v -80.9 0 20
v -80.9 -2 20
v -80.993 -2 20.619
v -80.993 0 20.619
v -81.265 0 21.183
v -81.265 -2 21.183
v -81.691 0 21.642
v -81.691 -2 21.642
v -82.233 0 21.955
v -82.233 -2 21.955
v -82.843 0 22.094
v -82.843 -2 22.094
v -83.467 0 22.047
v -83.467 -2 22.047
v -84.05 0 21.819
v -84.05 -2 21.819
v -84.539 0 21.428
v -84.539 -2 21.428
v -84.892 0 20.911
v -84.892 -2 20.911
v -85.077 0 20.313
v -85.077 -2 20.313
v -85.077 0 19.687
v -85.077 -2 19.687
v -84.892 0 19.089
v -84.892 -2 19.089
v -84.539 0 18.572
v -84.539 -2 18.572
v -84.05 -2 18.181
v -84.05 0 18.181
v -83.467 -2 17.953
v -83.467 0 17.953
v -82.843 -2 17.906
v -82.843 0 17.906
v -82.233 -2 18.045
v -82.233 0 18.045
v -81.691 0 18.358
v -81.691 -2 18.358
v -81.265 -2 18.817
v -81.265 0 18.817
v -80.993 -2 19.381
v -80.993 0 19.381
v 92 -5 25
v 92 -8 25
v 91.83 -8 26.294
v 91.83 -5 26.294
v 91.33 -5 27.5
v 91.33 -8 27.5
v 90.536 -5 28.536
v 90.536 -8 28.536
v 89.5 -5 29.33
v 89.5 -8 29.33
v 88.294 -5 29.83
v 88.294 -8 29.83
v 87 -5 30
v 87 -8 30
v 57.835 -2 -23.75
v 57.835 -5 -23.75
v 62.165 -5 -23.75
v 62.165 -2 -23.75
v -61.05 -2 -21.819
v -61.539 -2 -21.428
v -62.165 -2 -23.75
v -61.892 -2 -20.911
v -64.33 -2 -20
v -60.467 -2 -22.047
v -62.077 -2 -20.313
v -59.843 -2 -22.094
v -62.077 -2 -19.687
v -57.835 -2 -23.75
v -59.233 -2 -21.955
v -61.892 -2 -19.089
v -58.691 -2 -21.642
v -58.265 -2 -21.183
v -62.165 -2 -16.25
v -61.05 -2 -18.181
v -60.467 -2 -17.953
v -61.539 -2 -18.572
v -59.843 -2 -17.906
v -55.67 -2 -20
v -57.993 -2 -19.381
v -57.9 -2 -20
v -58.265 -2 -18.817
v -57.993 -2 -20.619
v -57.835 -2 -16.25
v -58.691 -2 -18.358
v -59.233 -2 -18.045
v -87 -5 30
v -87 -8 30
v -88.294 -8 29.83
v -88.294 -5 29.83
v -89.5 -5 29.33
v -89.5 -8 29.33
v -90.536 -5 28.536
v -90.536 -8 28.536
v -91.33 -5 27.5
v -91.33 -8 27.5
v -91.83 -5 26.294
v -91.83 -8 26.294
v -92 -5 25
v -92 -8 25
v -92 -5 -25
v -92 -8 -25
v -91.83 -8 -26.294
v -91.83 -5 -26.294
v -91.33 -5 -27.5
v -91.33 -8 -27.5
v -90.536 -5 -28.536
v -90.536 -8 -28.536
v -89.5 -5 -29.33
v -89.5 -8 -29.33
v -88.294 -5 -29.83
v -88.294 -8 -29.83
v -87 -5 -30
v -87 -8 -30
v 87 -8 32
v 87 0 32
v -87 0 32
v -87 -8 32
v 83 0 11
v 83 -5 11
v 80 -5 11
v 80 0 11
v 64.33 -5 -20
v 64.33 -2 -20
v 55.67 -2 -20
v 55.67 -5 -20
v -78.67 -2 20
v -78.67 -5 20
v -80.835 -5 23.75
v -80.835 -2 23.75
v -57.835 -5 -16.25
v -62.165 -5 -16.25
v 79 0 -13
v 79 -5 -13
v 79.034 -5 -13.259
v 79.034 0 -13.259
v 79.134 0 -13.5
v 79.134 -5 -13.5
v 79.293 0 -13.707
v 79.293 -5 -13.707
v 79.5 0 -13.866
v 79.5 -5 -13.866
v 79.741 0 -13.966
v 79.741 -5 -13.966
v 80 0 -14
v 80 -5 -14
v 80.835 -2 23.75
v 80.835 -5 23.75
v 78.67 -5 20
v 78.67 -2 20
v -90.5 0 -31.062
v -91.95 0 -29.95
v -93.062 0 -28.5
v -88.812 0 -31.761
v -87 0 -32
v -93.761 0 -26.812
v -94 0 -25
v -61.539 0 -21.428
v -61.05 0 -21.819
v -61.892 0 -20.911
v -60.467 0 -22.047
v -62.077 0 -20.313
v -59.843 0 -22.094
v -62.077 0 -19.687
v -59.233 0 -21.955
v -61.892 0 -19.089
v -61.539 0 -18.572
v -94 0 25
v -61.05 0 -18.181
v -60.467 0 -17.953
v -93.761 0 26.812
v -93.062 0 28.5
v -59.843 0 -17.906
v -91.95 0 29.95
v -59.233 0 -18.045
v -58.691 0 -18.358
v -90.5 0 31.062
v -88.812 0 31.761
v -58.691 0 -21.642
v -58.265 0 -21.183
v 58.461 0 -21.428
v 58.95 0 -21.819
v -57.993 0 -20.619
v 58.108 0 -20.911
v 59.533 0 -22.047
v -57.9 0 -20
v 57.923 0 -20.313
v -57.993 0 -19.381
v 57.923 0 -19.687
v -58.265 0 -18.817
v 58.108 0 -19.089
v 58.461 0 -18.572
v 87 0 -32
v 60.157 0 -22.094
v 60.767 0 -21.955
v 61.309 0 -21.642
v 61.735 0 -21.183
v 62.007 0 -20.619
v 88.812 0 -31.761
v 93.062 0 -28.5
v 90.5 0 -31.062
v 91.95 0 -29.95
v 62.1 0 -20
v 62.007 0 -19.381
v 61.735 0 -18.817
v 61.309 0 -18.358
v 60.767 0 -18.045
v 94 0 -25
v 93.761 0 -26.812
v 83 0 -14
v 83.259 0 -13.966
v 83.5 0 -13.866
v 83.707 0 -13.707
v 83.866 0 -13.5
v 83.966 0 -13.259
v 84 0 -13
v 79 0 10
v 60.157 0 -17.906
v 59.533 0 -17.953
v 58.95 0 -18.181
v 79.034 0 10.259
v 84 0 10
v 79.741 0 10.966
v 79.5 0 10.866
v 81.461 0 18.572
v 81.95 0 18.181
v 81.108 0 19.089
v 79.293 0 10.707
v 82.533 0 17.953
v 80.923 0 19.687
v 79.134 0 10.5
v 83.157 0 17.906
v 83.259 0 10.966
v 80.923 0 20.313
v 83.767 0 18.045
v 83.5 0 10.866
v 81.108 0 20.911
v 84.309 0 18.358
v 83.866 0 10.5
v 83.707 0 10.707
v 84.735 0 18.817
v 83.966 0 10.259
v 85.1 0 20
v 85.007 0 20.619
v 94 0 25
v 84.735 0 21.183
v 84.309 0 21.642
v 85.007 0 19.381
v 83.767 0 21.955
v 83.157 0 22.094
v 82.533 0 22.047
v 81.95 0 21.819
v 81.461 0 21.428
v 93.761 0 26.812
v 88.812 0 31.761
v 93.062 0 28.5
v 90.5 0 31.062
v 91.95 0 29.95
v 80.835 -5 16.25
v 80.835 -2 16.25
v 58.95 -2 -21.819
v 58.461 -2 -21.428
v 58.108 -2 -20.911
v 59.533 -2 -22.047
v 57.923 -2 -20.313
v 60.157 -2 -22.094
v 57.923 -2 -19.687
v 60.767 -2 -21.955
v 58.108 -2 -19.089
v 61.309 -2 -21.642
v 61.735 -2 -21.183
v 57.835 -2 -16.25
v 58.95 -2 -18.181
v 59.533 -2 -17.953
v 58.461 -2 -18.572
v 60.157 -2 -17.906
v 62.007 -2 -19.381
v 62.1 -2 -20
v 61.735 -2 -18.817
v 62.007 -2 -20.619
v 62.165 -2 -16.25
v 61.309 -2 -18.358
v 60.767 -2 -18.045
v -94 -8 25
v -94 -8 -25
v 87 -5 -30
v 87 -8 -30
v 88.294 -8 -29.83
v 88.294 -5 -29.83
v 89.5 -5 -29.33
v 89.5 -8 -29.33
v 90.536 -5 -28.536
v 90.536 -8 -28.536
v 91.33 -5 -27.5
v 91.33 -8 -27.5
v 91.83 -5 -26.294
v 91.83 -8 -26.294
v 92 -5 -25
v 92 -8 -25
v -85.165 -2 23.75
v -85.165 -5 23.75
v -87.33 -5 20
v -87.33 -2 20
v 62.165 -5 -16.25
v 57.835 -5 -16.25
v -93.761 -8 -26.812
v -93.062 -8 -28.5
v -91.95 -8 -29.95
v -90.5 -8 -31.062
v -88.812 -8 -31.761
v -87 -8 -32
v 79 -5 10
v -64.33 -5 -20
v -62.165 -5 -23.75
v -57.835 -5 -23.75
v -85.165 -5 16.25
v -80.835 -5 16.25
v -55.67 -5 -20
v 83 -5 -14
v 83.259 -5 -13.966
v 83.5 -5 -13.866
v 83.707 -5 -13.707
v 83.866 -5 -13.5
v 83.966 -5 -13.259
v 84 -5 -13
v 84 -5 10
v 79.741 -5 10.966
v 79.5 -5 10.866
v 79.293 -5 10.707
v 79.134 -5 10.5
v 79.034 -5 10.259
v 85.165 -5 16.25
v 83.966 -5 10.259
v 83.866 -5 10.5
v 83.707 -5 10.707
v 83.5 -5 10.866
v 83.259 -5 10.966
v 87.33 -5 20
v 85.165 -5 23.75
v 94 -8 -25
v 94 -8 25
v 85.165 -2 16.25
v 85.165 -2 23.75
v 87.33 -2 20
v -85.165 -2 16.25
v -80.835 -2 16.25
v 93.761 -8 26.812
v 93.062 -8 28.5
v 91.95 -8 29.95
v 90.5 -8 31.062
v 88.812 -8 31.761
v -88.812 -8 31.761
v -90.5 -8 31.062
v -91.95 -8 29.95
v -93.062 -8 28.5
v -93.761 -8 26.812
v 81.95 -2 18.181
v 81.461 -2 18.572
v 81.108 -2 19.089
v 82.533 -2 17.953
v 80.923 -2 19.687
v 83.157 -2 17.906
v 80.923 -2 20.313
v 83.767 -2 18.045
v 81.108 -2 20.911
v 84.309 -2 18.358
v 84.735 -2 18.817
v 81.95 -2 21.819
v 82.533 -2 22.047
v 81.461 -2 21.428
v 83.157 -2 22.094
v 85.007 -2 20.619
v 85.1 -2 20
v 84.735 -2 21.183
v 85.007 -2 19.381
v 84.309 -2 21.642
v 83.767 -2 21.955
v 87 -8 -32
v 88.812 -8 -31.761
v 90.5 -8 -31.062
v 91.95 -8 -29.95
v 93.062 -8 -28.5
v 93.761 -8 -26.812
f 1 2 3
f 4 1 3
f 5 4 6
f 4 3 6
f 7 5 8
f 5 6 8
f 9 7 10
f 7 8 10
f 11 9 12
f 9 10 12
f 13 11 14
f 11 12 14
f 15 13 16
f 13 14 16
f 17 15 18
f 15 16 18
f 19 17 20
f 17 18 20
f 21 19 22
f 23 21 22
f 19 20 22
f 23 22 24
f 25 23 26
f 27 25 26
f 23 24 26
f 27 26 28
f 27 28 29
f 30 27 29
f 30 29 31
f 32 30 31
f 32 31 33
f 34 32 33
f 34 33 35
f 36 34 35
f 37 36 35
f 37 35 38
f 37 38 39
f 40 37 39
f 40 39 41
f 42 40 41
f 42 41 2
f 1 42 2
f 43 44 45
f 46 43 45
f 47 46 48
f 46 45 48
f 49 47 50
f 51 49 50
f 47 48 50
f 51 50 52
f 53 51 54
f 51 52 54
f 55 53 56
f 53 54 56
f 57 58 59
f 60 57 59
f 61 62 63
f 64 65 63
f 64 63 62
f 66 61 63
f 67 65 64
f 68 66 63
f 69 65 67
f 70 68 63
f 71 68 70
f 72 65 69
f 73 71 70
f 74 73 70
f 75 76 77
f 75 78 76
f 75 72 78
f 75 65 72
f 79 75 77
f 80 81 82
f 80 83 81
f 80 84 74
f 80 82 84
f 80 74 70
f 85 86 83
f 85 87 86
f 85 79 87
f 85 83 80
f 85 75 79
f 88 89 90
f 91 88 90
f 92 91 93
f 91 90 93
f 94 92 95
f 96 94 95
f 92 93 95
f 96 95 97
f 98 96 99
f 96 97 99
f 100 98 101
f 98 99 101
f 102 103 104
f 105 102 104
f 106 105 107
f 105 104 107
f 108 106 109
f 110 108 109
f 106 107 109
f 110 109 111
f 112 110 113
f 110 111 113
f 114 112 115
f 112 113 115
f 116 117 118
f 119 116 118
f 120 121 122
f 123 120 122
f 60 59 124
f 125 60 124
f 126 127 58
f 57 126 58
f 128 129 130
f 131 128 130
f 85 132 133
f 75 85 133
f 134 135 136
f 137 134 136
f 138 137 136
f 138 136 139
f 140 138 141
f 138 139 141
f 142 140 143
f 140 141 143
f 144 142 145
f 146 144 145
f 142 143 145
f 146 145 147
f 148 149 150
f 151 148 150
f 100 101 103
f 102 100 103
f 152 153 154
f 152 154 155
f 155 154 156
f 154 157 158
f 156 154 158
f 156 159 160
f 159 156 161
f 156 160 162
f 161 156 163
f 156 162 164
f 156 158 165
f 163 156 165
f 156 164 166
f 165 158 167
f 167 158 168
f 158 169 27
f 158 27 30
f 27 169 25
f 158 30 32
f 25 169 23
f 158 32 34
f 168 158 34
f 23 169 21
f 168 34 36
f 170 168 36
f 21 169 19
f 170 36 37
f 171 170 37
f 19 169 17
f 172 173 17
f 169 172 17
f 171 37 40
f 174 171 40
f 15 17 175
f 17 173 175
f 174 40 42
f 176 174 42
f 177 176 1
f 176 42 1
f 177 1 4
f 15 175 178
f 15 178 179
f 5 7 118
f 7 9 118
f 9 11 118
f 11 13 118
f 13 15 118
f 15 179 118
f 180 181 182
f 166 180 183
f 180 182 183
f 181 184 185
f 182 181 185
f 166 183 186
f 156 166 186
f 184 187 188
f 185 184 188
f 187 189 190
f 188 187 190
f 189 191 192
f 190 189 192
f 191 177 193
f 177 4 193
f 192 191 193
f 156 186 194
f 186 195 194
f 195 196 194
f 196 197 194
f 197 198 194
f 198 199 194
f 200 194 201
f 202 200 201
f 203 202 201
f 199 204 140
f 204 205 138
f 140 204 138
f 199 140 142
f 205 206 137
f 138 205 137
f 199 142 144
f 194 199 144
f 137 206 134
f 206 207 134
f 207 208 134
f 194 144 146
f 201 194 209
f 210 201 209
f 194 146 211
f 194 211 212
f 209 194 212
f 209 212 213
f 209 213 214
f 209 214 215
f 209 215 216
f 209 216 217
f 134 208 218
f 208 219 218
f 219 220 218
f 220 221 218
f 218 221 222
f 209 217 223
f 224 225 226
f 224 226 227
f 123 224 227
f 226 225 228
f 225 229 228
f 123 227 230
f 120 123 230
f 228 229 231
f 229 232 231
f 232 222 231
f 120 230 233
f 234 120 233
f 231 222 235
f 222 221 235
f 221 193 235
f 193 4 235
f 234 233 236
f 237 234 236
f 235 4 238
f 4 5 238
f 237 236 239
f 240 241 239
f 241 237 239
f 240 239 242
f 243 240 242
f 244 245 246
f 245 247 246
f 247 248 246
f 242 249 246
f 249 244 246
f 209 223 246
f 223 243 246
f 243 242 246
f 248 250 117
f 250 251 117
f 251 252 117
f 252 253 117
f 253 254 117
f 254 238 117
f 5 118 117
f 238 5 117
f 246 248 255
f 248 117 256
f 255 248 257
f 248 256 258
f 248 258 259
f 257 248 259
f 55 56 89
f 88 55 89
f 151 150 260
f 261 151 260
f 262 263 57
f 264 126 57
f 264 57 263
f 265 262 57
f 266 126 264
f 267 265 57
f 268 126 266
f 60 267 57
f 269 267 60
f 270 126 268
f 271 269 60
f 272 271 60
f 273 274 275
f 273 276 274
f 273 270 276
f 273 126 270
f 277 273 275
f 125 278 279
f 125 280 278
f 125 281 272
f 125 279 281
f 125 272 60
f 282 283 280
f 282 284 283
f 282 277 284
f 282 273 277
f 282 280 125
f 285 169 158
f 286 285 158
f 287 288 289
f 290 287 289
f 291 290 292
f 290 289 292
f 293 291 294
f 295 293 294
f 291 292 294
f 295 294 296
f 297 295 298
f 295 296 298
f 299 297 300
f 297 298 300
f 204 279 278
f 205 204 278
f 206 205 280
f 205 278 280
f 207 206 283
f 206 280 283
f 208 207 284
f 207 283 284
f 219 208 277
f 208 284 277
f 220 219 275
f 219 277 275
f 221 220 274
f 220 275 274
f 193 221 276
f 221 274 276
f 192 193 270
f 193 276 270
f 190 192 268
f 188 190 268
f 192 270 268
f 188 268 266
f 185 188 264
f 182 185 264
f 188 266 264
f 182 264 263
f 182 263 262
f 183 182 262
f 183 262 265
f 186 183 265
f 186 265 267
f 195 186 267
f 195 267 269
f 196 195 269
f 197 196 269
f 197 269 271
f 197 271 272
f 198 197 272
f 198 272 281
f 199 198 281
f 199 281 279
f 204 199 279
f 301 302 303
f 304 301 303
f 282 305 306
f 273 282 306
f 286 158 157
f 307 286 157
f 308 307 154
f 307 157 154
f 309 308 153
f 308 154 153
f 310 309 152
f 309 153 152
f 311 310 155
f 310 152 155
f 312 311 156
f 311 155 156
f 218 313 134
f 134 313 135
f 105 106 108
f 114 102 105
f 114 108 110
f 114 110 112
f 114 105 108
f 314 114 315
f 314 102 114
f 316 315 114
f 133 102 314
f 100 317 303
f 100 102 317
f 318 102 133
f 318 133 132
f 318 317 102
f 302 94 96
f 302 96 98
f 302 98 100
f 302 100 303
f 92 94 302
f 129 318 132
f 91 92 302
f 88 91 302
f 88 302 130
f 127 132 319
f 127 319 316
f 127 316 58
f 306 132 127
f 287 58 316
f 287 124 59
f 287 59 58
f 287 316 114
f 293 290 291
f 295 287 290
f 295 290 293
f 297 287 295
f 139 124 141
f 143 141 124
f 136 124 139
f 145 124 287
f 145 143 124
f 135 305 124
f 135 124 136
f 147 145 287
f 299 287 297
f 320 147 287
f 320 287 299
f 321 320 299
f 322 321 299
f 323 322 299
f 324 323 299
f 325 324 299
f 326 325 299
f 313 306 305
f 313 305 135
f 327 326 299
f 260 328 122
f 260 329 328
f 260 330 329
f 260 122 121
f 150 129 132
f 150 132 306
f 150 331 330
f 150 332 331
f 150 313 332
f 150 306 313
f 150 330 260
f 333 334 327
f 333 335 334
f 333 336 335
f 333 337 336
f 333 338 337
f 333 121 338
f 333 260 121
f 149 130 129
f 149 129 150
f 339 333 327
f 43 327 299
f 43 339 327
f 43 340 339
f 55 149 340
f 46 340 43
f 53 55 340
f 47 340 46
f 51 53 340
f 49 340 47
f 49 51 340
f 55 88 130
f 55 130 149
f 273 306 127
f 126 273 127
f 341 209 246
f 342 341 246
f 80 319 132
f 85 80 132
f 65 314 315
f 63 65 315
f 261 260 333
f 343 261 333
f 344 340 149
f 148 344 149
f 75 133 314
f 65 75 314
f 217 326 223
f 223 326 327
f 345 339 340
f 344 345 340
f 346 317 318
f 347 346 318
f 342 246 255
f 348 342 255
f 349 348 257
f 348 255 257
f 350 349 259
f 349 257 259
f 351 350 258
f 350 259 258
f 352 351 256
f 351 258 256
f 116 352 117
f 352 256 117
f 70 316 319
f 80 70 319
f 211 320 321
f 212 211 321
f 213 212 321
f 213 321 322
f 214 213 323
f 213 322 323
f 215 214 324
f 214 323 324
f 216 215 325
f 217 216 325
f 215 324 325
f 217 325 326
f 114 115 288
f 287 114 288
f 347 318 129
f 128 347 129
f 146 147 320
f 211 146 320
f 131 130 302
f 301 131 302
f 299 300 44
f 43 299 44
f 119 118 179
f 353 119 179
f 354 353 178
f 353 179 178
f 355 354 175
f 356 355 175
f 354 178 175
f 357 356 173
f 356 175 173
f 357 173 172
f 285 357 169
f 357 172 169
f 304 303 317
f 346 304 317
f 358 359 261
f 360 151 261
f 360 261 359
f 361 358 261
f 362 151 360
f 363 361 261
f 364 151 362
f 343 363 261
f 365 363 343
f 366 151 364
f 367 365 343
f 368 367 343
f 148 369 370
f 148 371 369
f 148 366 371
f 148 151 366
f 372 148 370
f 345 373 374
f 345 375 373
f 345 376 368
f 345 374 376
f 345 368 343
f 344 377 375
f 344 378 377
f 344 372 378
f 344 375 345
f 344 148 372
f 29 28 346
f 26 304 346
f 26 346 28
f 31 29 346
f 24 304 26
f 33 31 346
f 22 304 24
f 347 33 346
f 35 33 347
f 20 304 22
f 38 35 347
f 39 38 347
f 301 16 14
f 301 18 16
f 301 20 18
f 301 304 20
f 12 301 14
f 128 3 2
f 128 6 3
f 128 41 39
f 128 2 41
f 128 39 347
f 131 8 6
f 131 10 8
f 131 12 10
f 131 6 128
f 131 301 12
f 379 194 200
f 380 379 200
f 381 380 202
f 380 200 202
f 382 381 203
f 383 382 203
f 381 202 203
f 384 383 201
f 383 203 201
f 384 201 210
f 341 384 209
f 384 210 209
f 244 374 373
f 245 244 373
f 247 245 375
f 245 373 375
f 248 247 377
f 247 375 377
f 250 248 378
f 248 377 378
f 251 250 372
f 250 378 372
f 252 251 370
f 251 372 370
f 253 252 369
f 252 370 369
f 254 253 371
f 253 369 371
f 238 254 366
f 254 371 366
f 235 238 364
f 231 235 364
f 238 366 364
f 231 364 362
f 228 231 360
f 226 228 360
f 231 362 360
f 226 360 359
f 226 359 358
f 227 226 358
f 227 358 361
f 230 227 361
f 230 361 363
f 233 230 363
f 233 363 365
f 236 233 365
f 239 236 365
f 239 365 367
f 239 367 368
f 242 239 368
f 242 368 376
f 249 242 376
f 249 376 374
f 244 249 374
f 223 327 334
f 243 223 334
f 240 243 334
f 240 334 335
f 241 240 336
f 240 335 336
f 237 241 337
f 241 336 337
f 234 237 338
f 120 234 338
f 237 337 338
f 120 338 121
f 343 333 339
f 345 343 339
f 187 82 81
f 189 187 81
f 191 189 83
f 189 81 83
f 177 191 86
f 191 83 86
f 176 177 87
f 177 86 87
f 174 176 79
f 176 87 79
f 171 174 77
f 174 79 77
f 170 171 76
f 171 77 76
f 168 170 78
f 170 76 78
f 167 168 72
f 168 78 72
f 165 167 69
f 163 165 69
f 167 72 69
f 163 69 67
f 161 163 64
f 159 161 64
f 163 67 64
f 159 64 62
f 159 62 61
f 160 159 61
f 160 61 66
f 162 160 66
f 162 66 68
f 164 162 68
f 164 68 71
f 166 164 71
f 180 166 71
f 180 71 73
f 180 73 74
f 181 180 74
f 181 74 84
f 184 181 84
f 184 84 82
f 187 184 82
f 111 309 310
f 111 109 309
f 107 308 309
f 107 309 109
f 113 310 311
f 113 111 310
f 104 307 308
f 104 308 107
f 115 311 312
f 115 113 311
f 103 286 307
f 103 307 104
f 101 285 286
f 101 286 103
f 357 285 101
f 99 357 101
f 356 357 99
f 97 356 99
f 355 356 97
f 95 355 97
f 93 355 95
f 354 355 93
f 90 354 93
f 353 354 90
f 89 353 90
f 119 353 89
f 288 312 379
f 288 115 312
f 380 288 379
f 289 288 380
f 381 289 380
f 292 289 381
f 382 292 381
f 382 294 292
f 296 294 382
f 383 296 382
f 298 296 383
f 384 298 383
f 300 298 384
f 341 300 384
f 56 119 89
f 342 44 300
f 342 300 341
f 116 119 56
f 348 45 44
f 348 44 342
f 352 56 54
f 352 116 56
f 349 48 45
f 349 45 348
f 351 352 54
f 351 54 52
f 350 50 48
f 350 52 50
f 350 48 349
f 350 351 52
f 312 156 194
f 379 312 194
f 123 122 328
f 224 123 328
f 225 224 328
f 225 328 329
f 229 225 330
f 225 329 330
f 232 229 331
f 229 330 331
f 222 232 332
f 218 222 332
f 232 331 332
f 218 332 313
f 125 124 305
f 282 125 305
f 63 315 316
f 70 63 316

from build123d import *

# Parameters (mm, degrees)
F1_DEPTH  = 8
F3_DEPTH  = 3
F7_DEPTH  = 3
F8_R      = 2.1
F9_DEPTH  = 5
F13_DEPTH = 25


with BuildPart() as f1:
    # F0 (on Front) → F1 (new body)
    with BuildSketch(Plane.XZ):
        with BuildLine():
            Line((-87, -32), (87, -32))
            ThreePointArc((87, -32), (91.949747, -29.949747), (94, -25))
            Line((94, -25), (94, 25))
            ThreePointArc((94, 25), (91.949747, 29.949747), (87, 32))
            Line((87, 32), (-87, 32))
            ThreePointArc((-87, 32), (-91.949747, 29.949747), (-94, 25))
            Line((-94, 25), (-94, -25))
            ThreePointArc((-94, -25), (-91.949747, -29.949747), (-87, -32))
        make_face()
    extrude(amount=F1_DEPTH)

    # F2 (on face) → F3 (cut)
    with BuildSketch(Plane.XZ.offset(8)):
        with BuildLine():
            Line((87, 30), (-87, 30))
            ThreePointArc((-87, 30), (-90.535534, 28.535534), (-92, 25))
            Line((-92, 25), (-92, -25))
            ThreePointArc((-92, -25), (-90.535534, -28.535534), (-87, -30))
            Line((-87, -30), (87, -30))
            ThreePointArc((87, -30), (90.535534, -28.535534), (92, -25))
            Line((92, -25), (92, 25))
            ThreePointArc((92, 25), (90.535534, 28.535534), (87, 30))
        make_face()
    extrude(amount=-F3_DEPTH, mode=Mode.SUBTRACT)

    # F6 (on face) → F7 (cut)
    with BuildSketch(Plane.XZ.offset(5)):
        Polygon((55.669873, -20), (57.834936, -23.75), (62.165064, -23.75), (64.330127, -20), (62.165064, -16.25), (57.834936, -16.25), align=None)
        Polygon((78.669873, 20), (80.834936, 16.25), (85.165064, 16.25), (87.330127, 20), (85.165064, 23.75), (80.834936, 23.75), align=None)
        Polygon((-64.330127, -20), (-62.165064, -23.75), (-57.834936, -23.75), (-55.669873, -20), (-57.834936, -16.25), (-62.165064, -16.25), align=None)
        Polygon((-87.330127, 20), (-85.165064, 16.25), (-80.834936, 16.25), (-78.669873, 20), (-80.834936, 23.75), (-85.165064, 23.75), align=None)
    extrude(amount=-F7_DEPTH, mode=Mode.SUBTRACT)

    # F8 (on face) → F9 (cut, through all)
    with BuildSketch(Plane.XZ.offset(5)):
        with Locations((-83, 20)):
            Circle(F8_R)
        with Locations((-60, -20)):
            Circle(F8_R)
        with Locations((83, 20)):
            Circle(F8_R)
        with Locations((60, -20)):
            Circle(F8_R)
    extrude(amount=-F9_DEPTH, mode=Mode.SUBTRACT)

    # F12 (on face) → F13 (cut)
    with BuildSketch(Plane.XZ.offset(5)):
        with BuildLine():
            ThreePointArc((79, -13), (79.292893, -13.707107), (80, -14))
            Line((80, -14), (83, -14))
            ThreePointArc((83, -14), (83.707107, -13.707107), (84, -13))
            Line((84, -13), (84, 10))
            ThreePointArc((84, 10), (83.707107, 10.707107), (83, 11))
            Line((83, 11), (80, 11))
            ThreePointArc((80, 11), (79.292893, 10.707107), (79, 10))
            Line((79, 10), (79, -13))
        make_face()
    extrude(amount=-F13_DEPTH, mode=Mode.SUBTRACT)


solid = f1.part
